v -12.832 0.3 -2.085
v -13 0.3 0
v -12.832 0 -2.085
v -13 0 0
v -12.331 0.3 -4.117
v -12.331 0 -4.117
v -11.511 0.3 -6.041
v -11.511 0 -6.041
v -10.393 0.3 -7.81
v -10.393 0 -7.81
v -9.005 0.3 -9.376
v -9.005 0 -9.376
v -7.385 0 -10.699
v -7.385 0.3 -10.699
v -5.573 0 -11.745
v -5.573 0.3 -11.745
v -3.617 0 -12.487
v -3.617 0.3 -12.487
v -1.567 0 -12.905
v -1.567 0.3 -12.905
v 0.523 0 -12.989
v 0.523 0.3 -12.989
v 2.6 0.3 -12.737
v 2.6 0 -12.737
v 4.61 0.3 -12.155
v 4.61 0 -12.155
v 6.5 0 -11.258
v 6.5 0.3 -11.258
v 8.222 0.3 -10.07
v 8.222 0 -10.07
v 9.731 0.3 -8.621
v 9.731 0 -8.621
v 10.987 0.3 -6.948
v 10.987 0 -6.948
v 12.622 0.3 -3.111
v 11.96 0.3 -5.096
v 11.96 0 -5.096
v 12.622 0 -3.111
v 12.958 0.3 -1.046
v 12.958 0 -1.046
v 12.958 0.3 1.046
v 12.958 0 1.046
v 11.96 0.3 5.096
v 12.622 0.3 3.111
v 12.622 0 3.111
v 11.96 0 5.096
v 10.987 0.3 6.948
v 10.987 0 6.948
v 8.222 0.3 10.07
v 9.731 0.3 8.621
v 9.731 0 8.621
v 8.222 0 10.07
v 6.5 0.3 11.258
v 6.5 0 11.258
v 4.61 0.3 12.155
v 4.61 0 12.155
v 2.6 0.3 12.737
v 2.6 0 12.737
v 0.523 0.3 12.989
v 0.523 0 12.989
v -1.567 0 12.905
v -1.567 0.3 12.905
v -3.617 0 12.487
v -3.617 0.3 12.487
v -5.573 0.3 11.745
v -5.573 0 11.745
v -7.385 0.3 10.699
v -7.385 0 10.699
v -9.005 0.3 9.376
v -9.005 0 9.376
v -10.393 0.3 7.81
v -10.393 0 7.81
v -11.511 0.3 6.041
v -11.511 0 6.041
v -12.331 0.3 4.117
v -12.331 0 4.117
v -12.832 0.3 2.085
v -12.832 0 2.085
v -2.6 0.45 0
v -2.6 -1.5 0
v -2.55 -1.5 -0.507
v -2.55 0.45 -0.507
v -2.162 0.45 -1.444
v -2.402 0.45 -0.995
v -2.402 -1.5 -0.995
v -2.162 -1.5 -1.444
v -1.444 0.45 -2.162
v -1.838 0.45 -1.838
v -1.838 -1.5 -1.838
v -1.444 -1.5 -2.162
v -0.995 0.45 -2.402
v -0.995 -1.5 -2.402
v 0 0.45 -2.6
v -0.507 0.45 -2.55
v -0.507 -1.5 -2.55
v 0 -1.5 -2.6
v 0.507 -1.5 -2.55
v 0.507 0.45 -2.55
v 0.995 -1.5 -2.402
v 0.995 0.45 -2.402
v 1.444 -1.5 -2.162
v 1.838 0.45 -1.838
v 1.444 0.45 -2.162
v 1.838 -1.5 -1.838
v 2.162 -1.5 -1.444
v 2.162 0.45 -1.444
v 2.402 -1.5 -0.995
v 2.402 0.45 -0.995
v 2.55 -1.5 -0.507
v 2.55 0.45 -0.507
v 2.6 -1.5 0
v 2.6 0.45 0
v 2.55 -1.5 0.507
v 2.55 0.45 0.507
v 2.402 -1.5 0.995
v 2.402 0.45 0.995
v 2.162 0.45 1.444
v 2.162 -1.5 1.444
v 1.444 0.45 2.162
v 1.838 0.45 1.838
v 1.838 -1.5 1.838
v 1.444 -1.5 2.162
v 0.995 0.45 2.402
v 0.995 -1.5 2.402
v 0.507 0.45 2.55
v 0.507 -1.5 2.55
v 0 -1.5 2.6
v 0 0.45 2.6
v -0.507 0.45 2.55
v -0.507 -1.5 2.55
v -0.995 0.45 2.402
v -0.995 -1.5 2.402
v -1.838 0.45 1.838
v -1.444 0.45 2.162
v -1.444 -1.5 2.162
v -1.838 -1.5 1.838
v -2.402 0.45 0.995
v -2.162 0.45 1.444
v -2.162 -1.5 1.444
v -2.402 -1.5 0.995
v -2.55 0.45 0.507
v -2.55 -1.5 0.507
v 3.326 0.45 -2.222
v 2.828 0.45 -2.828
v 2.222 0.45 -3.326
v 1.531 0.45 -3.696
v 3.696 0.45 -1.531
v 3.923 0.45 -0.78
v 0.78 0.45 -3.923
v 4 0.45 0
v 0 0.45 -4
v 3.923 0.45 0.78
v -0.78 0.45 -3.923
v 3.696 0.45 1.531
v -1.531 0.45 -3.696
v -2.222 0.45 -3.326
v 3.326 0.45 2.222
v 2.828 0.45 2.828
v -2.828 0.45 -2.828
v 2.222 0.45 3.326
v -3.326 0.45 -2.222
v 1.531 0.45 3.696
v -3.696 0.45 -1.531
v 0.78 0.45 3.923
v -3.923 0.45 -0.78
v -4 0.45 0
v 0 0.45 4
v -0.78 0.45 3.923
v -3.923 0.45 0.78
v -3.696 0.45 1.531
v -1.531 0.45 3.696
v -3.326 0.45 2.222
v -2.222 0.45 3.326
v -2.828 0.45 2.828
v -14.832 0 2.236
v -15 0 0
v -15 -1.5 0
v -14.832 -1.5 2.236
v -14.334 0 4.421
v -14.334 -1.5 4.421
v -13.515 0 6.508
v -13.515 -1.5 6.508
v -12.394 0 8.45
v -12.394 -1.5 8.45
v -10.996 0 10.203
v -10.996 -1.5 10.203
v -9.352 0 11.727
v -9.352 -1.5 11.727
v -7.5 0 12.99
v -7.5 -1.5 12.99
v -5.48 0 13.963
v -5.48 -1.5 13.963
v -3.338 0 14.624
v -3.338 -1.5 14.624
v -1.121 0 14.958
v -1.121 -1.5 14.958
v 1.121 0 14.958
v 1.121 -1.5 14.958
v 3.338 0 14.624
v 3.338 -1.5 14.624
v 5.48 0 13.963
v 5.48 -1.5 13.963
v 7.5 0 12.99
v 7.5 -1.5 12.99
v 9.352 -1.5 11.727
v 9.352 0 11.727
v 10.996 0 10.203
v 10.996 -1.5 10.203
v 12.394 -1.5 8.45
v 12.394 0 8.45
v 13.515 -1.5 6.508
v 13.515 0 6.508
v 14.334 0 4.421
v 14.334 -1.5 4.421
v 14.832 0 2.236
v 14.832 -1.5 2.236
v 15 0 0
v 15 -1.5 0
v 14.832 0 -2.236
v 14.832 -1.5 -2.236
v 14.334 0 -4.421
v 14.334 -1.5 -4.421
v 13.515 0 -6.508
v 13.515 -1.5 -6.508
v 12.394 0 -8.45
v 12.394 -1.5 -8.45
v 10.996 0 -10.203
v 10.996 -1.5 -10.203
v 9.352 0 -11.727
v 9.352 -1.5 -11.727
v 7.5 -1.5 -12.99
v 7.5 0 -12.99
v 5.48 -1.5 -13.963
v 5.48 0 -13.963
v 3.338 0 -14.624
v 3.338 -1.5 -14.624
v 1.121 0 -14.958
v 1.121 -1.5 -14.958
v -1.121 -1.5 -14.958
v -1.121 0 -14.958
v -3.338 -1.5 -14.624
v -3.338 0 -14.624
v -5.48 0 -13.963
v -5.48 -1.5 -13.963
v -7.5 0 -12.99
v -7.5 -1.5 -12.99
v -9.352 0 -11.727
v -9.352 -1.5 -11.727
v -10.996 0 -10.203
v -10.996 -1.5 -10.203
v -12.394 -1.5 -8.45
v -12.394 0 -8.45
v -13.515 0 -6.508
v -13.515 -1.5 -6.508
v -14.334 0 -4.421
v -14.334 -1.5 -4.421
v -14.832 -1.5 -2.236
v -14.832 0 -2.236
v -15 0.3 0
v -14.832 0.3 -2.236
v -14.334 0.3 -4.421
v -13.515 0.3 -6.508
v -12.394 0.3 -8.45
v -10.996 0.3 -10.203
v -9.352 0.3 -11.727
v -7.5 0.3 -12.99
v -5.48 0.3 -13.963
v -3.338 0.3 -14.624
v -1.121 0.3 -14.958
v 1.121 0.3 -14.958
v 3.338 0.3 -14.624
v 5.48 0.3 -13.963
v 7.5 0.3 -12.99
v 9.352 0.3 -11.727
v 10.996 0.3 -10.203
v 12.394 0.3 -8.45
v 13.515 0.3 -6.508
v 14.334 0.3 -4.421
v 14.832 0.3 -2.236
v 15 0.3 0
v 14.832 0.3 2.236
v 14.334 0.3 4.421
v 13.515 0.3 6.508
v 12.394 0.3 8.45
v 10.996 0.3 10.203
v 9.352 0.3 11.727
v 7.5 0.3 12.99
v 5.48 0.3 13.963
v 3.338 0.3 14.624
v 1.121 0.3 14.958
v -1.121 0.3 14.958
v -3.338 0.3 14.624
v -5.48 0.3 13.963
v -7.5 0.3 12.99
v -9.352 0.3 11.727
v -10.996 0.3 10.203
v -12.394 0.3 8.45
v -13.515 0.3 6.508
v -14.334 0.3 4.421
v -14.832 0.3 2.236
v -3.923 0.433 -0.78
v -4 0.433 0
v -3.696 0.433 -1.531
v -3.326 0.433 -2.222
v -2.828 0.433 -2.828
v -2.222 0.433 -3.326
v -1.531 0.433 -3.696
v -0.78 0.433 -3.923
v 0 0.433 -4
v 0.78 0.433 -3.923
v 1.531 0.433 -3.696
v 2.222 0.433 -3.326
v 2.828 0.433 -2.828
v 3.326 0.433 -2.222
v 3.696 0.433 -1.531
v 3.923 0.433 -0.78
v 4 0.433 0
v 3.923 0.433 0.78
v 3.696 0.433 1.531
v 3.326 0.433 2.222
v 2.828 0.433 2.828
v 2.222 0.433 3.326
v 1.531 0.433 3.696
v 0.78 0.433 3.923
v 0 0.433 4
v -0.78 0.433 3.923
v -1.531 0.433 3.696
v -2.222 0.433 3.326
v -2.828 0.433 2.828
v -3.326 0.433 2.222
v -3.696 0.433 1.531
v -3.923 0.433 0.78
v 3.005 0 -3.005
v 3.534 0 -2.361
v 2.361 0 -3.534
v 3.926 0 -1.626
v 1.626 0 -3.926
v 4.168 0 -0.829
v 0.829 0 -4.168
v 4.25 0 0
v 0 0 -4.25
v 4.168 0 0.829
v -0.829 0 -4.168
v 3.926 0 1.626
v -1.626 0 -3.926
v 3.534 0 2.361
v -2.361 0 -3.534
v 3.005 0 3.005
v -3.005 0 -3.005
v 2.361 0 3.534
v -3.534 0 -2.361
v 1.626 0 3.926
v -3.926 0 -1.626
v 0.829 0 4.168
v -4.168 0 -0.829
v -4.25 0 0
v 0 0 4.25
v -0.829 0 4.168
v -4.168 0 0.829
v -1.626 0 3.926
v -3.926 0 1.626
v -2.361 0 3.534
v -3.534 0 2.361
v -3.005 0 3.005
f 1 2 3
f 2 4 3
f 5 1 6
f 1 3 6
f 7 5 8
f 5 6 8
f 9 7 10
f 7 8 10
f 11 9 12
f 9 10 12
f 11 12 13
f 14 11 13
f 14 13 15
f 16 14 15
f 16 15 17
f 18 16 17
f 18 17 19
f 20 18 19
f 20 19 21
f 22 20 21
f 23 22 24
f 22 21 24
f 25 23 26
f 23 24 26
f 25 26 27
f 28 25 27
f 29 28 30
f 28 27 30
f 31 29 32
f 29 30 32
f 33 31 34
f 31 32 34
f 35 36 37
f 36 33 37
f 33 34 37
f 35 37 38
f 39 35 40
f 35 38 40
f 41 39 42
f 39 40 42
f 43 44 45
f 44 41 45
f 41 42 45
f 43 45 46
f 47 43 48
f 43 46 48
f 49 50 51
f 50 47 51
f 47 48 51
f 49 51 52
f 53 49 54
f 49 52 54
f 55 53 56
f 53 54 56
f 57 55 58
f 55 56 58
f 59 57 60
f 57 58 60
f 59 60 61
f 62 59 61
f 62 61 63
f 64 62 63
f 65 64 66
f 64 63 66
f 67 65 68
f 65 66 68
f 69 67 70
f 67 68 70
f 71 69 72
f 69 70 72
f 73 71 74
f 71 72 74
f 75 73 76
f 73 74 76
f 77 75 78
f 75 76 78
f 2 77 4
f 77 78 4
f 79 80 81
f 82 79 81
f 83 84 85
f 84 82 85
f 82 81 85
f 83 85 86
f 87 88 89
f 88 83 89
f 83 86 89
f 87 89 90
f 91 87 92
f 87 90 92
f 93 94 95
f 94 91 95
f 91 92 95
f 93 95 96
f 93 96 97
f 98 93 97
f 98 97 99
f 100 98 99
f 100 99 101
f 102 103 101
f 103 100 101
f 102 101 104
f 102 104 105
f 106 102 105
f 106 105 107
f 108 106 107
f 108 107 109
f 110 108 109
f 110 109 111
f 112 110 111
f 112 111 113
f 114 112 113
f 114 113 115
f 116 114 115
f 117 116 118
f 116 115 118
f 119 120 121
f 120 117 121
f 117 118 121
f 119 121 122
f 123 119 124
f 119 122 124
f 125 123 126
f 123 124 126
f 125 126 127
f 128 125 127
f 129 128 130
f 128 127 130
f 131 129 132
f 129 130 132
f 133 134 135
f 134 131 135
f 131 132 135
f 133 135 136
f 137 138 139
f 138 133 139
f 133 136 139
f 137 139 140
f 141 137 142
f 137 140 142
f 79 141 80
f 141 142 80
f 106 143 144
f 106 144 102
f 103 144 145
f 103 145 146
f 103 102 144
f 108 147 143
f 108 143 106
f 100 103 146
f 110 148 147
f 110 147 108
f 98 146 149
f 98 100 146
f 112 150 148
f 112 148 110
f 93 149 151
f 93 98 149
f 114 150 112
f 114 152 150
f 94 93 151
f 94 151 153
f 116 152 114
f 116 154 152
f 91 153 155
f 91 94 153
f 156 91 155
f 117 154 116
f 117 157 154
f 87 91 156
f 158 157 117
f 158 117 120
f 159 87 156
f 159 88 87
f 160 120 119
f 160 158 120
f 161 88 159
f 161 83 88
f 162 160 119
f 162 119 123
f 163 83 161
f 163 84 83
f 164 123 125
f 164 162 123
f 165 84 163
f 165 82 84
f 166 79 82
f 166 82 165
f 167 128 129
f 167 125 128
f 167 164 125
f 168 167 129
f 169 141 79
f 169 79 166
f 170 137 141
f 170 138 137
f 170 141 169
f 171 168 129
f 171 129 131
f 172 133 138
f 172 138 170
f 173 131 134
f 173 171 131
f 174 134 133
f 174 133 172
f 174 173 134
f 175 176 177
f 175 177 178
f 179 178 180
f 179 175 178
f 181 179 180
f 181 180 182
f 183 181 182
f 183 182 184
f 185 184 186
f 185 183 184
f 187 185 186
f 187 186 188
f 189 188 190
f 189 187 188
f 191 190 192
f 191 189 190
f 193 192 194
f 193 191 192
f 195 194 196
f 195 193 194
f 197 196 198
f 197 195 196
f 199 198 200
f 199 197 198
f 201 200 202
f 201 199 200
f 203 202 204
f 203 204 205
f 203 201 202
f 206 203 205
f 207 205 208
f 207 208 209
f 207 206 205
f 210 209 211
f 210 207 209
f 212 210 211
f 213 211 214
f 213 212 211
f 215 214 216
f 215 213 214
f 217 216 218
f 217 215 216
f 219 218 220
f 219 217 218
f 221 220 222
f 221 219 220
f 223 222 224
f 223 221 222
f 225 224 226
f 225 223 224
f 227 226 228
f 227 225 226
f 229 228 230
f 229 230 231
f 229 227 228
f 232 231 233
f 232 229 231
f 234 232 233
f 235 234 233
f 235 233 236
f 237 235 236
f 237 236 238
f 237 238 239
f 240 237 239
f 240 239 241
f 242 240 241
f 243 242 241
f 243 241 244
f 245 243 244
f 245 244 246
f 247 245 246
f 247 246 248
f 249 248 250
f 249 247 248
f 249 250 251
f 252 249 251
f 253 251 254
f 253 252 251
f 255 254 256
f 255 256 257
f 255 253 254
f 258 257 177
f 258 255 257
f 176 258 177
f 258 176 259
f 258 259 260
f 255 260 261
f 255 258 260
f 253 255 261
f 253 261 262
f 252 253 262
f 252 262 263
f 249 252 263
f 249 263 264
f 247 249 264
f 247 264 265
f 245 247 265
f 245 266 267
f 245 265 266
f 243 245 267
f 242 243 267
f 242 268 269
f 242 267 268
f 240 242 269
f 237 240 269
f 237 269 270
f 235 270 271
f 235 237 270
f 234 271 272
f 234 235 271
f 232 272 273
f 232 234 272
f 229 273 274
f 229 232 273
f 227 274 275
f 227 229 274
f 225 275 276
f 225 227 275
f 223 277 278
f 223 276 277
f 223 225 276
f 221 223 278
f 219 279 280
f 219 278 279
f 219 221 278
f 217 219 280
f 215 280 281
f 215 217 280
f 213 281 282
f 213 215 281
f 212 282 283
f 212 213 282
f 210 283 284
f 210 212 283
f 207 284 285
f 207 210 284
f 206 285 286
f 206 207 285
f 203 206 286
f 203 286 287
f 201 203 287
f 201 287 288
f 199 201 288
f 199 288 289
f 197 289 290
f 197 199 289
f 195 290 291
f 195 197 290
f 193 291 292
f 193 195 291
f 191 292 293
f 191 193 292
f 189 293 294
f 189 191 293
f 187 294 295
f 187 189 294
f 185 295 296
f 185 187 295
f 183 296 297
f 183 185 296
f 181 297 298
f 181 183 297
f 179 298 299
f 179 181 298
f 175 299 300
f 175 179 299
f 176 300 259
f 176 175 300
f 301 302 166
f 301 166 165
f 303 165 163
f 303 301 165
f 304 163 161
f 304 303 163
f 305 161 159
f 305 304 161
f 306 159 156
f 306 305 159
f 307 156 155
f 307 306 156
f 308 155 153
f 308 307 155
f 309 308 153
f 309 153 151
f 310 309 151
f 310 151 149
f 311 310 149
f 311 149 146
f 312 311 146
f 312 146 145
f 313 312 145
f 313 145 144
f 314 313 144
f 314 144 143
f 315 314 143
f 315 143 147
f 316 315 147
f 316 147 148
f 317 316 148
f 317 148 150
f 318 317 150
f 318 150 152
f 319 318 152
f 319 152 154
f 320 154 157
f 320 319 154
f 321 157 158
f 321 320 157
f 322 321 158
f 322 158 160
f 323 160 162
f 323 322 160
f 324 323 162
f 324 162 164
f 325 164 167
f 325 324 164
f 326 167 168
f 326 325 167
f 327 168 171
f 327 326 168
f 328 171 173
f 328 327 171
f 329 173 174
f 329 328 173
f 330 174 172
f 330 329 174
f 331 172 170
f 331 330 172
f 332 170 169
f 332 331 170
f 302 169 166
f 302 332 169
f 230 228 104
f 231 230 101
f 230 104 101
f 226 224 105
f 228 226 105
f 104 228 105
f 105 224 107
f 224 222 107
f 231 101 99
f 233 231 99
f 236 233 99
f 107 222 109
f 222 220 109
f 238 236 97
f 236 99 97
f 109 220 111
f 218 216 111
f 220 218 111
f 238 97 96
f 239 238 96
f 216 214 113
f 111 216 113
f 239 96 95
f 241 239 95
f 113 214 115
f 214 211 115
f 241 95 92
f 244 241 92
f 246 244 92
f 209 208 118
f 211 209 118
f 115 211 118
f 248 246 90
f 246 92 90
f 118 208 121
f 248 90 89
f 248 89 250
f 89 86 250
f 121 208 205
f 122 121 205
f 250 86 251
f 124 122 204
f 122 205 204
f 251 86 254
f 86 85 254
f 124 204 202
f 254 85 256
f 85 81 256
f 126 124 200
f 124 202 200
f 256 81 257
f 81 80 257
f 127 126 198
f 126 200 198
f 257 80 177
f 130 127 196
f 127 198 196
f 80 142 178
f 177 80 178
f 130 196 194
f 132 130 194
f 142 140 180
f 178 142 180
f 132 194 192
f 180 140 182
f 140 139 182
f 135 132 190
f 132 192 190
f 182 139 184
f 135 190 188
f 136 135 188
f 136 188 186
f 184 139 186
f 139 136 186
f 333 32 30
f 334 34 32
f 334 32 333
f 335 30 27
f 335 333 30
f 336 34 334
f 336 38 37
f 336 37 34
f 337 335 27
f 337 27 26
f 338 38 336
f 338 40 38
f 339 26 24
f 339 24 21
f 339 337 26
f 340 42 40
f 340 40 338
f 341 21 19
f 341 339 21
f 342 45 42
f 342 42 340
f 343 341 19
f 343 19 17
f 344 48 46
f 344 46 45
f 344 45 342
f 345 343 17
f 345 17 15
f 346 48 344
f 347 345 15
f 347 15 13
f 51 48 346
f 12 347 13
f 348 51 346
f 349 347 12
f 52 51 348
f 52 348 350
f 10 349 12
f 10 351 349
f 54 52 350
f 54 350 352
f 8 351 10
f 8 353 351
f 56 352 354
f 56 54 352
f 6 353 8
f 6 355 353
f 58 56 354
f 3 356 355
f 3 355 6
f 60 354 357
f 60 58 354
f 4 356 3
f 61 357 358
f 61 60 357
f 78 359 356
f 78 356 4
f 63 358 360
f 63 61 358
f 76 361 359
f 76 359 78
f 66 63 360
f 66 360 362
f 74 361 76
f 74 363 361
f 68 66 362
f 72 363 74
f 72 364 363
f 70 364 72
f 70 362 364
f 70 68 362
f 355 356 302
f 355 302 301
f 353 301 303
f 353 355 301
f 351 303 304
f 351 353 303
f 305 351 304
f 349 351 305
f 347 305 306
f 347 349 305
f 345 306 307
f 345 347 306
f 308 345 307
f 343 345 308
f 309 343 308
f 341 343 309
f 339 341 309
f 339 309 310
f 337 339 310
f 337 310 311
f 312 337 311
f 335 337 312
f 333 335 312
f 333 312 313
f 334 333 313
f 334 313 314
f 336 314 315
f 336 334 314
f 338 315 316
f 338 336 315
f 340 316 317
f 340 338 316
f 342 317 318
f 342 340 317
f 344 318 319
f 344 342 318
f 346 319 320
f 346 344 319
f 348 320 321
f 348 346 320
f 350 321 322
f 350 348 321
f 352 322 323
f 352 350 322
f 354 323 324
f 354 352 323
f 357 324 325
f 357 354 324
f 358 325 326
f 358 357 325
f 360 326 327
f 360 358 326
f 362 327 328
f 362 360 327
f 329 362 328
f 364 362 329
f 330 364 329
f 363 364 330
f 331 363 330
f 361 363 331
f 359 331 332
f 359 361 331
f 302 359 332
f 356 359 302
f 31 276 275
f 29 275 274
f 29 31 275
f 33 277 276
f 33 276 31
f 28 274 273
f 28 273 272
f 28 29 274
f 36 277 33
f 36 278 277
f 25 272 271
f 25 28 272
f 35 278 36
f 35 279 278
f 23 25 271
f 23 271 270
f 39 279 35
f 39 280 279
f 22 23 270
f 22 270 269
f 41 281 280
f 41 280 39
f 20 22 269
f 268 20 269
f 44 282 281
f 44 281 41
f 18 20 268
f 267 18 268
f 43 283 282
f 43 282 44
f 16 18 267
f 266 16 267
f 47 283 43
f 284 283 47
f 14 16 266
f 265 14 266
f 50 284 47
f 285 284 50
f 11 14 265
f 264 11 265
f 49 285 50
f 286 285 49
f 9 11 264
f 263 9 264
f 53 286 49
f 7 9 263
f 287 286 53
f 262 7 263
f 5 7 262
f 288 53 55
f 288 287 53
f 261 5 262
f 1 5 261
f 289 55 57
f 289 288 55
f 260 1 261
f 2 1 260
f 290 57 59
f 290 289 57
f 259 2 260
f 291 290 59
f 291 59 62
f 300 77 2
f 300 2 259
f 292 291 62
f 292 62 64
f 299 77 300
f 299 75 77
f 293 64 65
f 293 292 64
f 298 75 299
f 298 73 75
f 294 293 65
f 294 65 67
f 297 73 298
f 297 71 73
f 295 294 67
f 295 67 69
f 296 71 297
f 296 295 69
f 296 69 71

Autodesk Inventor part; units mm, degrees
ref_plane "YZ Plane" through (0, 0, 0) normal (1, 0, 0) x (0, 1, 0)
ref_plane "XZ Plane" through (0, 0, 0) normal (0, 1, 0) x (-1, 0, 0)
ref_plane "XY Plane" through (0, 0, 0) normal (0, 0, 1) x (1, 0, 0)
sketch "Sketch1" plane through (0, 0, 0) normal (0, 1, 0) x (-1, 0, 0)
  circle A0 centre (0, 0) radius 2.6
  circle A1 centre (0, 0) radius 4
  circle A2 centre (0, 0) radius 15
  circle A3 centre (0, 0) radius 13
  dimension "d21" = 5.2
  dimension "d22" = 8
  dimension "d23" = 30
  dimension "d31" = 2
extrude "Extrusion6" add sketch "Sketch1" against normal blind 1.5 contours A1 | A2 | A3
extrude "Extrusion7" add sketch "Sketch1" along normal blind 0.45 contours A1
chamfer "Chamfer1" distance 0.25 angle 60 1 edges at (4, 0, 0) measured on face at (-11.188, 0, -1.1966)
extrude "Extrusion8" add sketch "Sketch1" along normal blind 0.3 contours A2
properties part number "071_0204_RollCutter20mmScrewClamp8mm"
